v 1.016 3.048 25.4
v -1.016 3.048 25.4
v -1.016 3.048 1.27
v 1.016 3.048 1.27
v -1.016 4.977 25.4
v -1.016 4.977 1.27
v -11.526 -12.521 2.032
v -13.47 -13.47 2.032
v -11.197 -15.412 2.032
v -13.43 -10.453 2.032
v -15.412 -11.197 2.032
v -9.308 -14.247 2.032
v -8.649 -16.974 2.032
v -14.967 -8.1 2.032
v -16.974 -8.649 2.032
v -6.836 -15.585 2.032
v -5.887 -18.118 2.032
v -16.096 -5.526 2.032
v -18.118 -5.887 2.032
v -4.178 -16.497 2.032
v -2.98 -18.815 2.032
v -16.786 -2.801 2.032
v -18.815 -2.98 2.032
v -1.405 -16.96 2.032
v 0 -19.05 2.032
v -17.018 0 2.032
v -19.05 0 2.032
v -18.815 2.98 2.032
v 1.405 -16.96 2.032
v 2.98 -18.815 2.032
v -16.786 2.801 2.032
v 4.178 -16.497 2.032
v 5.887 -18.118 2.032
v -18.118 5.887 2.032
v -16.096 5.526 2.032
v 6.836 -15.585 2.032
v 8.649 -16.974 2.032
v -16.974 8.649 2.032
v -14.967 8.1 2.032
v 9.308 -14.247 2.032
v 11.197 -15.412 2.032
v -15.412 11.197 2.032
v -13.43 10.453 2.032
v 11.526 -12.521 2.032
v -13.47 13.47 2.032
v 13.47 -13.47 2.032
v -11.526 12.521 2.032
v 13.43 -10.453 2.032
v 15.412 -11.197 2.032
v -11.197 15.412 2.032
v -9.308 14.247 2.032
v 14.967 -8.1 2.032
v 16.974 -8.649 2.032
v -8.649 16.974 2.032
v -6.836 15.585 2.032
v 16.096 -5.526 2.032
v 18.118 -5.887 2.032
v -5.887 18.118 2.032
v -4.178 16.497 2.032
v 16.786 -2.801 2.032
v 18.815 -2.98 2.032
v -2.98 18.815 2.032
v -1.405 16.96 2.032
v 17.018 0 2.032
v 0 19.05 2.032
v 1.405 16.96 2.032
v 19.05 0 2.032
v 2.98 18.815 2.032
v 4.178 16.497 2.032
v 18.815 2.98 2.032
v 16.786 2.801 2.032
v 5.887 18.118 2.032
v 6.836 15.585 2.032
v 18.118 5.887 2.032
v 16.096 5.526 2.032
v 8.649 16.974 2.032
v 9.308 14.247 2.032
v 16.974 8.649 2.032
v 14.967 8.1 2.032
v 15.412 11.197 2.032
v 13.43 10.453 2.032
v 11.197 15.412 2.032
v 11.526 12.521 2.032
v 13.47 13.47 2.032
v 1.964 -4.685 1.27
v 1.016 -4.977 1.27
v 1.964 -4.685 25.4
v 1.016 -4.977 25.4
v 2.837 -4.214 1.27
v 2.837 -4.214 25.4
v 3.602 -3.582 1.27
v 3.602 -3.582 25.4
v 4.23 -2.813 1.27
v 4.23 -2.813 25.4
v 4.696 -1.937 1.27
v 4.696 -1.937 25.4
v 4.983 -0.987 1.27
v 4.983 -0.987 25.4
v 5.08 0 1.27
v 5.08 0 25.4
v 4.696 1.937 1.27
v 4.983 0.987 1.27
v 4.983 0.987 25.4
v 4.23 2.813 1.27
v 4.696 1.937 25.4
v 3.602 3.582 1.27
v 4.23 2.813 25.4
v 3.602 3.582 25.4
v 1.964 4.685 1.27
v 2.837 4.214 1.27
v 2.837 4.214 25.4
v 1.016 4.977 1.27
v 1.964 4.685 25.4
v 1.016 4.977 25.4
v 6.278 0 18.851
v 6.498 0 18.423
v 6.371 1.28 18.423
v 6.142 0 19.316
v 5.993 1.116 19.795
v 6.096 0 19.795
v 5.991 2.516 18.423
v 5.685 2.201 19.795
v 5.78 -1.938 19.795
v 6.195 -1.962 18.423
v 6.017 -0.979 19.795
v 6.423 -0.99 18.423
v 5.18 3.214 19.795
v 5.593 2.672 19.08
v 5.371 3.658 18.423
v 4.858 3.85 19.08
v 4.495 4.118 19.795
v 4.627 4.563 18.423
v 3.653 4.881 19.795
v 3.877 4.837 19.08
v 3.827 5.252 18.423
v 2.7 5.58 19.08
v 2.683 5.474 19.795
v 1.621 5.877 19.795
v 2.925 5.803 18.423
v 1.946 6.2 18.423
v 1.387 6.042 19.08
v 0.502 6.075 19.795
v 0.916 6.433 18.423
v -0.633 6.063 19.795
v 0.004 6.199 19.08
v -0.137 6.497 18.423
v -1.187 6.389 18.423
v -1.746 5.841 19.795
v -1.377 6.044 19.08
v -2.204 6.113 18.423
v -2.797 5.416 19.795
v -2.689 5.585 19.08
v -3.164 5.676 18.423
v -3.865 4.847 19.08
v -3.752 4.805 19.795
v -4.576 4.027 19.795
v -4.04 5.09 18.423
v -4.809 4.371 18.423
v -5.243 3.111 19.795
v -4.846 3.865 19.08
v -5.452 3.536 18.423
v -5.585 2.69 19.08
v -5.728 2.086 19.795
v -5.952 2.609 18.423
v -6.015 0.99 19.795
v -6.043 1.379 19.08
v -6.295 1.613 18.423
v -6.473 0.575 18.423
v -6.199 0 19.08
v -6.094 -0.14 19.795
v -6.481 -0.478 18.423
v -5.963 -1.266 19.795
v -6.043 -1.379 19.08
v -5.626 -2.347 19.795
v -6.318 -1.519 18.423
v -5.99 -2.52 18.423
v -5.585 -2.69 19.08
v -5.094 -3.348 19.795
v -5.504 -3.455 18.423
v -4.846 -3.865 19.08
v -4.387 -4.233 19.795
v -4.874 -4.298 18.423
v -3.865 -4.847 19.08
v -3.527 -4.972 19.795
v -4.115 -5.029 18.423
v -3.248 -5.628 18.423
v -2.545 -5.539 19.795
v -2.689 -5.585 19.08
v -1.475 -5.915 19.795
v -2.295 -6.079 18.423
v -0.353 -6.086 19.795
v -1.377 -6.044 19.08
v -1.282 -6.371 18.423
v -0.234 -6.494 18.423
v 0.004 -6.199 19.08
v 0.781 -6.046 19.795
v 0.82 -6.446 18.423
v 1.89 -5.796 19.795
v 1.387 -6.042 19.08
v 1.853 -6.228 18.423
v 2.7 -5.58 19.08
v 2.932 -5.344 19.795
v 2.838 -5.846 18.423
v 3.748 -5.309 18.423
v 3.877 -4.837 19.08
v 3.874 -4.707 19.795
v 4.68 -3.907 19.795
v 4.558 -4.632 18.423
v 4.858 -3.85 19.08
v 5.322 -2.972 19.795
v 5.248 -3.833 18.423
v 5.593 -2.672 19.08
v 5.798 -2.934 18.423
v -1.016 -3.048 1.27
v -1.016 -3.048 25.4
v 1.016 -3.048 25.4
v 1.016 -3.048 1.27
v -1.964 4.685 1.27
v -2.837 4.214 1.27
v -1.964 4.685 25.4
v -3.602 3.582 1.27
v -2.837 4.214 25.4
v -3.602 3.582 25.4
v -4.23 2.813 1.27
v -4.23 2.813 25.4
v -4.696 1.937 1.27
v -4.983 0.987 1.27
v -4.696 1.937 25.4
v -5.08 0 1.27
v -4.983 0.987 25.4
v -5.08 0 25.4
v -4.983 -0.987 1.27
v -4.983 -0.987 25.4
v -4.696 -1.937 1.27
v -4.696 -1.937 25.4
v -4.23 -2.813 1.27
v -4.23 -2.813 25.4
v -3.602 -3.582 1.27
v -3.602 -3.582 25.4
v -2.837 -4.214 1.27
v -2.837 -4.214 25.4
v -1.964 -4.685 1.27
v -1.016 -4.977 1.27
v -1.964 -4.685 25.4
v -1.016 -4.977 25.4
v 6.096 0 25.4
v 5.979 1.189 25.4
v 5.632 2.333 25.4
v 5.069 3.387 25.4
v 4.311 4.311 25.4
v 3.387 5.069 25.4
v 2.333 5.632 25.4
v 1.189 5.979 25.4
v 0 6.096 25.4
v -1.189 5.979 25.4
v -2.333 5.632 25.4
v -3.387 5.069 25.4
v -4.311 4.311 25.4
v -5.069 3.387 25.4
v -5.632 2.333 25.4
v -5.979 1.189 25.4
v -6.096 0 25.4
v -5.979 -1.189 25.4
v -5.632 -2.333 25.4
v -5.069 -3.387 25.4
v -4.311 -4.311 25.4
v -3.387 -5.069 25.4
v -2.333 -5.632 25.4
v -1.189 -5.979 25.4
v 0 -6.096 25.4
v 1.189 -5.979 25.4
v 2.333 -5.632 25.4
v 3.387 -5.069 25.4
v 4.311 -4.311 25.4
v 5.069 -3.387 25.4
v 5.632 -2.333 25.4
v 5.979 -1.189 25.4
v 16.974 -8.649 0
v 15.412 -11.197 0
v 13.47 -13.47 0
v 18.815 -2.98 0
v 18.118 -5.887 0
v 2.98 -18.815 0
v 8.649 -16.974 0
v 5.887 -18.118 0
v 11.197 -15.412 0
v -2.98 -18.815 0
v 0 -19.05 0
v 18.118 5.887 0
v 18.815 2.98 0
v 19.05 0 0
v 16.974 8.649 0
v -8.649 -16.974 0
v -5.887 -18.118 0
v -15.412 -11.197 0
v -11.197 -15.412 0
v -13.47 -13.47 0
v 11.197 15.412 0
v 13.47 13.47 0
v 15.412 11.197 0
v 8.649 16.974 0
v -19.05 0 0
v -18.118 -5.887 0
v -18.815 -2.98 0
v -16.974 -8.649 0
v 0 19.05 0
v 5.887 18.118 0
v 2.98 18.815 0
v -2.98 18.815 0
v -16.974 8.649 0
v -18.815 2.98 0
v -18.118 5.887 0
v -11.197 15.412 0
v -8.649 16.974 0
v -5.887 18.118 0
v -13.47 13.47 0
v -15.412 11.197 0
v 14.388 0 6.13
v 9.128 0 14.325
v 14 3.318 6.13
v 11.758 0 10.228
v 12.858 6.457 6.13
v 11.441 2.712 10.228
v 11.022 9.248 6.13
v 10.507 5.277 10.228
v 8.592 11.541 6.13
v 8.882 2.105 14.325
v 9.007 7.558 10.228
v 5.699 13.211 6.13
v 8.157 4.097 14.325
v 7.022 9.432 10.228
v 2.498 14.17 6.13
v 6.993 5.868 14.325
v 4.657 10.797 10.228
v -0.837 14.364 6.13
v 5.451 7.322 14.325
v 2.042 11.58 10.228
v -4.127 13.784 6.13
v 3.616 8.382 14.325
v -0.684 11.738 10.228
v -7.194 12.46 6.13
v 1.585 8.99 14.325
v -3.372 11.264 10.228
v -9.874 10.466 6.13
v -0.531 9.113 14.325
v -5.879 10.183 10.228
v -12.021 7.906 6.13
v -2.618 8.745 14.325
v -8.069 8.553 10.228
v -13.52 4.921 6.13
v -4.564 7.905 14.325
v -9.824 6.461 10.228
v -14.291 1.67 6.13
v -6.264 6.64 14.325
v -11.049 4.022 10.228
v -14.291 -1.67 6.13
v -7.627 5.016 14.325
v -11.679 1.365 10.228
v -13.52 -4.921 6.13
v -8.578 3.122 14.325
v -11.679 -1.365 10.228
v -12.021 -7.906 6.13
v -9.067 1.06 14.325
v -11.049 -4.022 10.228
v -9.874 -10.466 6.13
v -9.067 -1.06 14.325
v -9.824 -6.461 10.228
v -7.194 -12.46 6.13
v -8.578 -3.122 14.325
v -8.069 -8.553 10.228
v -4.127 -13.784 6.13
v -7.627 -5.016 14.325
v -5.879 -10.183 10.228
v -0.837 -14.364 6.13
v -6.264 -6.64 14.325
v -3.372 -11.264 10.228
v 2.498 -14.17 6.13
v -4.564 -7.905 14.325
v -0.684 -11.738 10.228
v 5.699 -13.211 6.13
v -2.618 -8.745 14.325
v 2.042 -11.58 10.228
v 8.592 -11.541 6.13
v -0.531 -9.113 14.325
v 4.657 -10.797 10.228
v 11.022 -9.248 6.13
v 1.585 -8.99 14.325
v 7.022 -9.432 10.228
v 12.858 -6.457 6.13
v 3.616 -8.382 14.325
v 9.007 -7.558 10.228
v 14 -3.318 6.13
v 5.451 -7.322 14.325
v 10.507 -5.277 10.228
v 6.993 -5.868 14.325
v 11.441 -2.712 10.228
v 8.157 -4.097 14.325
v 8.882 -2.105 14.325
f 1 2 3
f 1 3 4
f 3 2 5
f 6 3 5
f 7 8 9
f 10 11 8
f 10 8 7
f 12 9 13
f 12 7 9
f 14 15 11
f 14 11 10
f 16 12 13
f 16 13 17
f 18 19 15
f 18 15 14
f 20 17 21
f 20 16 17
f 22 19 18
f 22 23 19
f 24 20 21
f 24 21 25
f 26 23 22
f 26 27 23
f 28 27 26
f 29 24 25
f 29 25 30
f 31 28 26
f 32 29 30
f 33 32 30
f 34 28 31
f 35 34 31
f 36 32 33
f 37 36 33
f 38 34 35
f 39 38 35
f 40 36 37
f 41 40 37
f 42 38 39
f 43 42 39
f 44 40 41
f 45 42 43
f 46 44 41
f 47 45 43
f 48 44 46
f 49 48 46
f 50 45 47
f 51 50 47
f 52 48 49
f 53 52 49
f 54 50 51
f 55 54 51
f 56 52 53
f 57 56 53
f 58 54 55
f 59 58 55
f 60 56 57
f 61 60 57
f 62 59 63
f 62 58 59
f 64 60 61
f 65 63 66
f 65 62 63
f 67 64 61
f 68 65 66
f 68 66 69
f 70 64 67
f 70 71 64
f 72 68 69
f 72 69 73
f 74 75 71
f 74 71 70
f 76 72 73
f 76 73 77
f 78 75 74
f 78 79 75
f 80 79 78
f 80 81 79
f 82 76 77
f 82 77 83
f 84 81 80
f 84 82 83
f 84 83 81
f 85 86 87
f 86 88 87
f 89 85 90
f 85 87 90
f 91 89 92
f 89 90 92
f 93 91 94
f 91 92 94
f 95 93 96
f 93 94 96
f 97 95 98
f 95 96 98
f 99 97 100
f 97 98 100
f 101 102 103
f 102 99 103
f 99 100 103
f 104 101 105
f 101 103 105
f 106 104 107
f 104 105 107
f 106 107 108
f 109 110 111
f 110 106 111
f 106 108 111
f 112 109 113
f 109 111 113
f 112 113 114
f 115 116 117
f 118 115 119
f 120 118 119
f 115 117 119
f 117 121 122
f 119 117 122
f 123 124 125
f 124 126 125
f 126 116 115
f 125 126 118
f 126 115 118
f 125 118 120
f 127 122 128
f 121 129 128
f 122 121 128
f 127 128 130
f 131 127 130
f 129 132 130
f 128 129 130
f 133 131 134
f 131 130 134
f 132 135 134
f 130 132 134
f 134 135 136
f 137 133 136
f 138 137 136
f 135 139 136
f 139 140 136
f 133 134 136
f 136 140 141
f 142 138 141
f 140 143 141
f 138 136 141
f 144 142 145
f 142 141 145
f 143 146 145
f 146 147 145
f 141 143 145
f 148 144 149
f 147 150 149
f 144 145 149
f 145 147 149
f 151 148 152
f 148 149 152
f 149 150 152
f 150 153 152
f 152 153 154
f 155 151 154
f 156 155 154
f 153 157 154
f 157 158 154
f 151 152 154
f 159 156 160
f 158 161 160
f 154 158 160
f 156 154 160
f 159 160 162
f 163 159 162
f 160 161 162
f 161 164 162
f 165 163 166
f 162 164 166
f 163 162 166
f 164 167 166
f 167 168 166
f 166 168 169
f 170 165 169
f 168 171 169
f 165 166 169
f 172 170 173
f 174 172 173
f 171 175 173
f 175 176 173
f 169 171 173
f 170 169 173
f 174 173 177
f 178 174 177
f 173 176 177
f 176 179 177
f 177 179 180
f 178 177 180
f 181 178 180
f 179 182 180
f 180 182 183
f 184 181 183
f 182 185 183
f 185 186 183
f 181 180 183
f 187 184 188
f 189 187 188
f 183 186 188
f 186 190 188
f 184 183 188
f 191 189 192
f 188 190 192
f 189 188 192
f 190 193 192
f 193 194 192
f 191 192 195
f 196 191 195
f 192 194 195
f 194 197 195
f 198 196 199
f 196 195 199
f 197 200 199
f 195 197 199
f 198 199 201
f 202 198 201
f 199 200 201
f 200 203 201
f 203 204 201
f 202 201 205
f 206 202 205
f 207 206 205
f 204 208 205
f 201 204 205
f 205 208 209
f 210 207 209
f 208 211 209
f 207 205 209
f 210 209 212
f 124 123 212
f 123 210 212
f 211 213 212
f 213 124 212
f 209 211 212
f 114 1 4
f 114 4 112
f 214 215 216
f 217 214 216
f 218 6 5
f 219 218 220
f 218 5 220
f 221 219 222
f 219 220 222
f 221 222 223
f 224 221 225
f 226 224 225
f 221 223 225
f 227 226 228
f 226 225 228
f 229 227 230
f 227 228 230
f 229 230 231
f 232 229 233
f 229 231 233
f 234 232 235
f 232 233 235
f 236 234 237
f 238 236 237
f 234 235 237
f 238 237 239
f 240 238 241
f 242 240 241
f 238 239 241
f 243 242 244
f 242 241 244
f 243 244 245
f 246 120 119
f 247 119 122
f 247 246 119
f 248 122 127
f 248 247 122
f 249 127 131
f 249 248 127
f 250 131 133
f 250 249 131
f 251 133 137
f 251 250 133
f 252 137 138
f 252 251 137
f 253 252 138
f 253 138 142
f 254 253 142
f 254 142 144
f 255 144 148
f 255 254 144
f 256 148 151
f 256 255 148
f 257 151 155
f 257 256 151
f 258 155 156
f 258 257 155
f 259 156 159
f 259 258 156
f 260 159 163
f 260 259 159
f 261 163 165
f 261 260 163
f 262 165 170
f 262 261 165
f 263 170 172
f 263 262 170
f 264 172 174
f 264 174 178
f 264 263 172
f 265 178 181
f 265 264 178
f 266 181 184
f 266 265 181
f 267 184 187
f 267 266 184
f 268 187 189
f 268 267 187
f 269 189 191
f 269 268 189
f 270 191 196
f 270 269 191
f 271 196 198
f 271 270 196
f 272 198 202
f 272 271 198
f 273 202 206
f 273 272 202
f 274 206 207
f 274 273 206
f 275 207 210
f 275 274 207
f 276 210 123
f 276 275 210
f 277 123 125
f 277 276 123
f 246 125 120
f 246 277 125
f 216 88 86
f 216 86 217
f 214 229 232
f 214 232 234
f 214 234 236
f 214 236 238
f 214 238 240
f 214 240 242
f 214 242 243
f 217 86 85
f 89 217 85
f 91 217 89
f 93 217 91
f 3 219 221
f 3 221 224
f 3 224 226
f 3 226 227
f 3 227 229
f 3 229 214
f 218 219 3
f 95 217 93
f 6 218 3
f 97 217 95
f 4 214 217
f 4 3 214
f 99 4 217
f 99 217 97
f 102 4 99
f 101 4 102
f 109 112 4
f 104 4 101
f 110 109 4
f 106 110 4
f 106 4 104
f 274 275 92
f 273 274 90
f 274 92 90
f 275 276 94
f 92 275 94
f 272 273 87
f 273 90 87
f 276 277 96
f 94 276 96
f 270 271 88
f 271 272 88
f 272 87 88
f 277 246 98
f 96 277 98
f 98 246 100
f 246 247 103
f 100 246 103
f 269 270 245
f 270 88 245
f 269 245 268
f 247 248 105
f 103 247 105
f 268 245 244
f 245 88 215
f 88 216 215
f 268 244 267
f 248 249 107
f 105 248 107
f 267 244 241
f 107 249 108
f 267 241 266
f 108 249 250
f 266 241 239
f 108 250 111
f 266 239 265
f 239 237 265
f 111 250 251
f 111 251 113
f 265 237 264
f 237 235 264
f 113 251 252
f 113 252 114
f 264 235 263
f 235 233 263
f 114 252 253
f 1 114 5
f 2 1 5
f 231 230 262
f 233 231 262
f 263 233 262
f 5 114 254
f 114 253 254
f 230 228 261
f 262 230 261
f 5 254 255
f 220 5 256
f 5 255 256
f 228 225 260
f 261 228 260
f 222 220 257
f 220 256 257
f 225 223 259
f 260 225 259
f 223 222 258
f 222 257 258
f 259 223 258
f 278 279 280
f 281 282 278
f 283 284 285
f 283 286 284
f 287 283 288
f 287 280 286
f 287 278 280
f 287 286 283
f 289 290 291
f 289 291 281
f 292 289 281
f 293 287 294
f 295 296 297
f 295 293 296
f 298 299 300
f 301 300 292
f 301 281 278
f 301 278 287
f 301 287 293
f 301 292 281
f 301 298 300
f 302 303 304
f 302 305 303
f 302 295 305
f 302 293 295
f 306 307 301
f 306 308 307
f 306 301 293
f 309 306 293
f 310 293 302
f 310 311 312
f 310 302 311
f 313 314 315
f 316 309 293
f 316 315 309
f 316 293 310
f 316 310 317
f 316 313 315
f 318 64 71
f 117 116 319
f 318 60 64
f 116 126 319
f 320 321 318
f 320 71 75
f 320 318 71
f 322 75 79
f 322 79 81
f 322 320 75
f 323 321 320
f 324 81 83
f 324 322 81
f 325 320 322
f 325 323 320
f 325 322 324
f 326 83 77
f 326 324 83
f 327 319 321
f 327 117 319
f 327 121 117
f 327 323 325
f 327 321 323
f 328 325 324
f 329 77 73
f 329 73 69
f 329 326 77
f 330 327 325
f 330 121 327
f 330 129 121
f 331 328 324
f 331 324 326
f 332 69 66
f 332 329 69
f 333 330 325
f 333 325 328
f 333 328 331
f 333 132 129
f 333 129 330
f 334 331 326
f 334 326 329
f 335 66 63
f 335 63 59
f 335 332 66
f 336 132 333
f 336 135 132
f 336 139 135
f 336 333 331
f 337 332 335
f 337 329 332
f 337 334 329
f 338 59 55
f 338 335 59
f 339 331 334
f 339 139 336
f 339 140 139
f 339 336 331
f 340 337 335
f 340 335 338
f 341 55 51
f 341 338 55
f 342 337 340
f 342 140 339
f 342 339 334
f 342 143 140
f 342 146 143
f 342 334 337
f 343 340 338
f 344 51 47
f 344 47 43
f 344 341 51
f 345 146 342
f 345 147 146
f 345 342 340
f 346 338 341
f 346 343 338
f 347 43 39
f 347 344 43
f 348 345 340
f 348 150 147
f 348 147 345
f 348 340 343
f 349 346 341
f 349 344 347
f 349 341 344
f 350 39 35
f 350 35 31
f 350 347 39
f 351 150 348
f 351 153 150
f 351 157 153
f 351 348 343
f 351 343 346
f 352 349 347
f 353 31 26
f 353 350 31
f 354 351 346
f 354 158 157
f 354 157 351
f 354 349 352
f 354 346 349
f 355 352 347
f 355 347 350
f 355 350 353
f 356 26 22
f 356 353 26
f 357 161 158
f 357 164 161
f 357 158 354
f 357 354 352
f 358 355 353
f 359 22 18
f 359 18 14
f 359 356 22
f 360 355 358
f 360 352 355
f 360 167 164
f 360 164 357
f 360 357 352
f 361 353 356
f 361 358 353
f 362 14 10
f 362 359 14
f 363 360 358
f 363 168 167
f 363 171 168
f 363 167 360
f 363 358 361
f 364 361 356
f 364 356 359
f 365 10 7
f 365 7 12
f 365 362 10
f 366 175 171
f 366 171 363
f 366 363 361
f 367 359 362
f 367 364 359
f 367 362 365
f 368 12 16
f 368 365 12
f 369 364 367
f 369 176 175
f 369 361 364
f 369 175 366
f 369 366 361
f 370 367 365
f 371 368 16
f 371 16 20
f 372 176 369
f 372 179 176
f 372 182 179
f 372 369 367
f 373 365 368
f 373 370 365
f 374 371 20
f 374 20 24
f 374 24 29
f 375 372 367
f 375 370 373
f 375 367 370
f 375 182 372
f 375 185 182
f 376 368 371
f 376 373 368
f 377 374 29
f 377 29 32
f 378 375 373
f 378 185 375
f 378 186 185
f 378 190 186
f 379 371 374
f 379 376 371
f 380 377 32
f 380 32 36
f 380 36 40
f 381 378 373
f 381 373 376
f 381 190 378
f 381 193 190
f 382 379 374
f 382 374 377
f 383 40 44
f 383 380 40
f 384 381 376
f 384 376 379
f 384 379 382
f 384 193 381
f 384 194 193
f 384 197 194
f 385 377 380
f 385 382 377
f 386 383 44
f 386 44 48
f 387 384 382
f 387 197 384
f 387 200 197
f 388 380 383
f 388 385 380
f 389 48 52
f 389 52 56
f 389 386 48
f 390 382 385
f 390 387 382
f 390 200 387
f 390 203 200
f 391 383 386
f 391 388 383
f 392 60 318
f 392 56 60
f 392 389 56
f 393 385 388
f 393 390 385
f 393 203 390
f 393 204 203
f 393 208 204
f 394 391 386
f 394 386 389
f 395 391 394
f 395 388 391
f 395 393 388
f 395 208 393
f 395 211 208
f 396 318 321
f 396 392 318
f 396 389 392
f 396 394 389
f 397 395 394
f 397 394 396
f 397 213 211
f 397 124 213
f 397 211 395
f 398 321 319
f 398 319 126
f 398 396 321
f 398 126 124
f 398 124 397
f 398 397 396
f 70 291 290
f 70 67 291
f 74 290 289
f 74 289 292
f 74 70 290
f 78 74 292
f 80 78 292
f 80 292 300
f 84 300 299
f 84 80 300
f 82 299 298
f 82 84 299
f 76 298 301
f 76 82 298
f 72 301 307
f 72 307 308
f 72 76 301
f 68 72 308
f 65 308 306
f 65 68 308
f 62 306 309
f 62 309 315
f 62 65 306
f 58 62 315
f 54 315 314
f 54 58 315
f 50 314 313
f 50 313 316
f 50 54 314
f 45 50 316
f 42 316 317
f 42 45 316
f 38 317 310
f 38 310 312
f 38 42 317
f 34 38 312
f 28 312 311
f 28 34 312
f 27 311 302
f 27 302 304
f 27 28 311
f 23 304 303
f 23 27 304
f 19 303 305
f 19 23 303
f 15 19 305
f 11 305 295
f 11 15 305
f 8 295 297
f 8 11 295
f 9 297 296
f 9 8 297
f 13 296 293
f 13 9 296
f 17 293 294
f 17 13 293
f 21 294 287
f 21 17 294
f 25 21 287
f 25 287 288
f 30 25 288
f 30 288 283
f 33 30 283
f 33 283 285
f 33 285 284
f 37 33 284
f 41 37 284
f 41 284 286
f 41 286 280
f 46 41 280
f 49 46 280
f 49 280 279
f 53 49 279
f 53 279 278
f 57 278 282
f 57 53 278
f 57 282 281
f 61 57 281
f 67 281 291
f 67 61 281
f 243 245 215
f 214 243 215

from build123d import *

# Parameters (mm, degrees)
F0_W     = 6.096
F0_H     = 6.35
F2_R     = 5.08
F3_DEPTH = 24.13
F4_R     = 2.54
F5_W     = 2.032
F5_H     = 2.54
F6_DEPTH = 25.4


with BuildPart() as f1:
    # F0 (on Front) → F1 (revolve)
    with BuildSketch(Plane.XZ):
        Polygon((0, 19.05), (0, 0), (19.05, 0), (19.05, 2.032), (17.018, 2.032), (6.096, 19.05), align=None)
        with Locations((3.048, 22.225)):
            Rectangle(F0_W, F0_H)
    revolve(axis=Axis((0, 0, 9.525), (0, 0, 1)))

    # F2 (on face) → F3 (cut)
    with BuildSketch(Plane.XY.offset(25.4)):
        Circle(F2_R)
    extrude(amount=-F3_DEPTH, mode=Mode.SUBTRACT)

    # F4
    f4_edges = [f1.edges().sort_by_distance(p)[0] for p in [
        (-6.096, 0, 19.05),
    ]]
    fillet(f4_edges, radius=F4_R)

    # F5 (on face) → F6 (join)
    with BuildSketch(Plane.XY.offset(25.4)):
        with Locations((0, -4.318)):
            Rectangle(F5_W, F5_H)
        with Locations((0, 4.318)):
            Rectangle(F5_W, F5_H)
    extrude(amount=-F6_DEPTH)


solid = f1.part
